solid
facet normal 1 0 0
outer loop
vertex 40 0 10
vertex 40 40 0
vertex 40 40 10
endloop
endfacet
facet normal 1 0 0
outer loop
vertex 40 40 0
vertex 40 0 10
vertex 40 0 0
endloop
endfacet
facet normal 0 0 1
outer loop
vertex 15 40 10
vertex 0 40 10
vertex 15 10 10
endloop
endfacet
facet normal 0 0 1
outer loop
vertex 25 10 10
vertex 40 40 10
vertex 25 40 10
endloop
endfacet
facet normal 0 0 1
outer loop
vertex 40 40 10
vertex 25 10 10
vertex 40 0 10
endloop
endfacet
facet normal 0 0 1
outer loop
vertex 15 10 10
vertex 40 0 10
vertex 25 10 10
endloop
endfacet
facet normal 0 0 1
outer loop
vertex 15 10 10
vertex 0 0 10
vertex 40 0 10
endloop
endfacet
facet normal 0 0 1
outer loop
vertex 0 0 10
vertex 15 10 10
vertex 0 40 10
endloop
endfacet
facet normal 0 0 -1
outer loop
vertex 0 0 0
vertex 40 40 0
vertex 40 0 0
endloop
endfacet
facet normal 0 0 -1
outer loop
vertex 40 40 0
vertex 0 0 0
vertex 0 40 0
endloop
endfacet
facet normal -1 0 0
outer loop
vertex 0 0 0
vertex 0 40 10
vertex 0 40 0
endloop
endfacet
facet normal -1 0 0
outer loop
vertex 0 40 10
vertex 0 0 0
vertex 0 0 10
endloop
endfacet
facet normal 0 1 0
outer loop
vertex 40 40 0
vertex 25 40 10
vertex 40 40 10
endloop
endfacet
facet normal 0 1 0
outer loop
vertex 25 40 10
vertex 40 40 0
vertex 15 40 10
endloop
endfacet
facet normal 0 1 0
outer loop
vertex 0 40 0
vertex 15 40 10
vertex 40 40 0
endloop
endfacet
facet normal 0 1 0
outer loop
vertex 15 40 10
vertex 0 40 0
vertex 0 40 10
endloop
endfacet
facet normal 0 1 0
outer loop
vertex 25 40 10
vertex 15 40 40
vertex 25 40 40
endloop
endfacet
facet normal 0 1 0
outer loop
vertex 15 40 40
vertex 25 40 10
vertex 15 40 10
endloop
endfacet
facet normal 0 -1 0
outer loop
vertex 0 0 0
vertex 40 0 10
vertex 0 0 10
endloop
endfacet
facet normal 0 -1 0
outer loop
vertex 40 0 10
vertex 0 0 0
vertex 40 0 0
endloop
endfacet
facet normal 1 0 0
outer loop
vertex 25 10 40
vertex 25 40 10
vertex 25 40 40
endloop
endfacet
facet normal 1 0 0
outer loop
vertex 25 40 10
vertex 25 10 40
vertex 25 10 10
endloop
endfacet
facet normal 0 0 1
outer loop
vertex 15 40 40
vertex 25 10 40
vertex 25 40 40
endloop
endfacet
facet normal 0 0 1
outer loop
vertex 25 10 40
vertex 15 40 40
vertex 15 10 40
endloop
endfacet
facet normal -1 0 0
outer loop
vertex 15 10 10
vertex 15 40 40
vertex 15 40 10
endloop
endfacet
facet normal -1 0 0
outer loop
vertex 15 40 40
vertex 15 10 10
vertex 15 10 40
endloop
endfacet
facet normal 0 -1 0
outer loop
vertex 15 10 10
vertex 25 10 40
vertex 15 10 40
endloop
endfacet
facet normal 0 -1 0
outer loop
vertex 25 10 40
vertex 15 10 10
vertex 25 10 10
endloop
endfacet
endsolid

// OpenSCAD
union(){
cube([40,40,10]);
translate([15,10,0])
cube([10,30,40]);
}
